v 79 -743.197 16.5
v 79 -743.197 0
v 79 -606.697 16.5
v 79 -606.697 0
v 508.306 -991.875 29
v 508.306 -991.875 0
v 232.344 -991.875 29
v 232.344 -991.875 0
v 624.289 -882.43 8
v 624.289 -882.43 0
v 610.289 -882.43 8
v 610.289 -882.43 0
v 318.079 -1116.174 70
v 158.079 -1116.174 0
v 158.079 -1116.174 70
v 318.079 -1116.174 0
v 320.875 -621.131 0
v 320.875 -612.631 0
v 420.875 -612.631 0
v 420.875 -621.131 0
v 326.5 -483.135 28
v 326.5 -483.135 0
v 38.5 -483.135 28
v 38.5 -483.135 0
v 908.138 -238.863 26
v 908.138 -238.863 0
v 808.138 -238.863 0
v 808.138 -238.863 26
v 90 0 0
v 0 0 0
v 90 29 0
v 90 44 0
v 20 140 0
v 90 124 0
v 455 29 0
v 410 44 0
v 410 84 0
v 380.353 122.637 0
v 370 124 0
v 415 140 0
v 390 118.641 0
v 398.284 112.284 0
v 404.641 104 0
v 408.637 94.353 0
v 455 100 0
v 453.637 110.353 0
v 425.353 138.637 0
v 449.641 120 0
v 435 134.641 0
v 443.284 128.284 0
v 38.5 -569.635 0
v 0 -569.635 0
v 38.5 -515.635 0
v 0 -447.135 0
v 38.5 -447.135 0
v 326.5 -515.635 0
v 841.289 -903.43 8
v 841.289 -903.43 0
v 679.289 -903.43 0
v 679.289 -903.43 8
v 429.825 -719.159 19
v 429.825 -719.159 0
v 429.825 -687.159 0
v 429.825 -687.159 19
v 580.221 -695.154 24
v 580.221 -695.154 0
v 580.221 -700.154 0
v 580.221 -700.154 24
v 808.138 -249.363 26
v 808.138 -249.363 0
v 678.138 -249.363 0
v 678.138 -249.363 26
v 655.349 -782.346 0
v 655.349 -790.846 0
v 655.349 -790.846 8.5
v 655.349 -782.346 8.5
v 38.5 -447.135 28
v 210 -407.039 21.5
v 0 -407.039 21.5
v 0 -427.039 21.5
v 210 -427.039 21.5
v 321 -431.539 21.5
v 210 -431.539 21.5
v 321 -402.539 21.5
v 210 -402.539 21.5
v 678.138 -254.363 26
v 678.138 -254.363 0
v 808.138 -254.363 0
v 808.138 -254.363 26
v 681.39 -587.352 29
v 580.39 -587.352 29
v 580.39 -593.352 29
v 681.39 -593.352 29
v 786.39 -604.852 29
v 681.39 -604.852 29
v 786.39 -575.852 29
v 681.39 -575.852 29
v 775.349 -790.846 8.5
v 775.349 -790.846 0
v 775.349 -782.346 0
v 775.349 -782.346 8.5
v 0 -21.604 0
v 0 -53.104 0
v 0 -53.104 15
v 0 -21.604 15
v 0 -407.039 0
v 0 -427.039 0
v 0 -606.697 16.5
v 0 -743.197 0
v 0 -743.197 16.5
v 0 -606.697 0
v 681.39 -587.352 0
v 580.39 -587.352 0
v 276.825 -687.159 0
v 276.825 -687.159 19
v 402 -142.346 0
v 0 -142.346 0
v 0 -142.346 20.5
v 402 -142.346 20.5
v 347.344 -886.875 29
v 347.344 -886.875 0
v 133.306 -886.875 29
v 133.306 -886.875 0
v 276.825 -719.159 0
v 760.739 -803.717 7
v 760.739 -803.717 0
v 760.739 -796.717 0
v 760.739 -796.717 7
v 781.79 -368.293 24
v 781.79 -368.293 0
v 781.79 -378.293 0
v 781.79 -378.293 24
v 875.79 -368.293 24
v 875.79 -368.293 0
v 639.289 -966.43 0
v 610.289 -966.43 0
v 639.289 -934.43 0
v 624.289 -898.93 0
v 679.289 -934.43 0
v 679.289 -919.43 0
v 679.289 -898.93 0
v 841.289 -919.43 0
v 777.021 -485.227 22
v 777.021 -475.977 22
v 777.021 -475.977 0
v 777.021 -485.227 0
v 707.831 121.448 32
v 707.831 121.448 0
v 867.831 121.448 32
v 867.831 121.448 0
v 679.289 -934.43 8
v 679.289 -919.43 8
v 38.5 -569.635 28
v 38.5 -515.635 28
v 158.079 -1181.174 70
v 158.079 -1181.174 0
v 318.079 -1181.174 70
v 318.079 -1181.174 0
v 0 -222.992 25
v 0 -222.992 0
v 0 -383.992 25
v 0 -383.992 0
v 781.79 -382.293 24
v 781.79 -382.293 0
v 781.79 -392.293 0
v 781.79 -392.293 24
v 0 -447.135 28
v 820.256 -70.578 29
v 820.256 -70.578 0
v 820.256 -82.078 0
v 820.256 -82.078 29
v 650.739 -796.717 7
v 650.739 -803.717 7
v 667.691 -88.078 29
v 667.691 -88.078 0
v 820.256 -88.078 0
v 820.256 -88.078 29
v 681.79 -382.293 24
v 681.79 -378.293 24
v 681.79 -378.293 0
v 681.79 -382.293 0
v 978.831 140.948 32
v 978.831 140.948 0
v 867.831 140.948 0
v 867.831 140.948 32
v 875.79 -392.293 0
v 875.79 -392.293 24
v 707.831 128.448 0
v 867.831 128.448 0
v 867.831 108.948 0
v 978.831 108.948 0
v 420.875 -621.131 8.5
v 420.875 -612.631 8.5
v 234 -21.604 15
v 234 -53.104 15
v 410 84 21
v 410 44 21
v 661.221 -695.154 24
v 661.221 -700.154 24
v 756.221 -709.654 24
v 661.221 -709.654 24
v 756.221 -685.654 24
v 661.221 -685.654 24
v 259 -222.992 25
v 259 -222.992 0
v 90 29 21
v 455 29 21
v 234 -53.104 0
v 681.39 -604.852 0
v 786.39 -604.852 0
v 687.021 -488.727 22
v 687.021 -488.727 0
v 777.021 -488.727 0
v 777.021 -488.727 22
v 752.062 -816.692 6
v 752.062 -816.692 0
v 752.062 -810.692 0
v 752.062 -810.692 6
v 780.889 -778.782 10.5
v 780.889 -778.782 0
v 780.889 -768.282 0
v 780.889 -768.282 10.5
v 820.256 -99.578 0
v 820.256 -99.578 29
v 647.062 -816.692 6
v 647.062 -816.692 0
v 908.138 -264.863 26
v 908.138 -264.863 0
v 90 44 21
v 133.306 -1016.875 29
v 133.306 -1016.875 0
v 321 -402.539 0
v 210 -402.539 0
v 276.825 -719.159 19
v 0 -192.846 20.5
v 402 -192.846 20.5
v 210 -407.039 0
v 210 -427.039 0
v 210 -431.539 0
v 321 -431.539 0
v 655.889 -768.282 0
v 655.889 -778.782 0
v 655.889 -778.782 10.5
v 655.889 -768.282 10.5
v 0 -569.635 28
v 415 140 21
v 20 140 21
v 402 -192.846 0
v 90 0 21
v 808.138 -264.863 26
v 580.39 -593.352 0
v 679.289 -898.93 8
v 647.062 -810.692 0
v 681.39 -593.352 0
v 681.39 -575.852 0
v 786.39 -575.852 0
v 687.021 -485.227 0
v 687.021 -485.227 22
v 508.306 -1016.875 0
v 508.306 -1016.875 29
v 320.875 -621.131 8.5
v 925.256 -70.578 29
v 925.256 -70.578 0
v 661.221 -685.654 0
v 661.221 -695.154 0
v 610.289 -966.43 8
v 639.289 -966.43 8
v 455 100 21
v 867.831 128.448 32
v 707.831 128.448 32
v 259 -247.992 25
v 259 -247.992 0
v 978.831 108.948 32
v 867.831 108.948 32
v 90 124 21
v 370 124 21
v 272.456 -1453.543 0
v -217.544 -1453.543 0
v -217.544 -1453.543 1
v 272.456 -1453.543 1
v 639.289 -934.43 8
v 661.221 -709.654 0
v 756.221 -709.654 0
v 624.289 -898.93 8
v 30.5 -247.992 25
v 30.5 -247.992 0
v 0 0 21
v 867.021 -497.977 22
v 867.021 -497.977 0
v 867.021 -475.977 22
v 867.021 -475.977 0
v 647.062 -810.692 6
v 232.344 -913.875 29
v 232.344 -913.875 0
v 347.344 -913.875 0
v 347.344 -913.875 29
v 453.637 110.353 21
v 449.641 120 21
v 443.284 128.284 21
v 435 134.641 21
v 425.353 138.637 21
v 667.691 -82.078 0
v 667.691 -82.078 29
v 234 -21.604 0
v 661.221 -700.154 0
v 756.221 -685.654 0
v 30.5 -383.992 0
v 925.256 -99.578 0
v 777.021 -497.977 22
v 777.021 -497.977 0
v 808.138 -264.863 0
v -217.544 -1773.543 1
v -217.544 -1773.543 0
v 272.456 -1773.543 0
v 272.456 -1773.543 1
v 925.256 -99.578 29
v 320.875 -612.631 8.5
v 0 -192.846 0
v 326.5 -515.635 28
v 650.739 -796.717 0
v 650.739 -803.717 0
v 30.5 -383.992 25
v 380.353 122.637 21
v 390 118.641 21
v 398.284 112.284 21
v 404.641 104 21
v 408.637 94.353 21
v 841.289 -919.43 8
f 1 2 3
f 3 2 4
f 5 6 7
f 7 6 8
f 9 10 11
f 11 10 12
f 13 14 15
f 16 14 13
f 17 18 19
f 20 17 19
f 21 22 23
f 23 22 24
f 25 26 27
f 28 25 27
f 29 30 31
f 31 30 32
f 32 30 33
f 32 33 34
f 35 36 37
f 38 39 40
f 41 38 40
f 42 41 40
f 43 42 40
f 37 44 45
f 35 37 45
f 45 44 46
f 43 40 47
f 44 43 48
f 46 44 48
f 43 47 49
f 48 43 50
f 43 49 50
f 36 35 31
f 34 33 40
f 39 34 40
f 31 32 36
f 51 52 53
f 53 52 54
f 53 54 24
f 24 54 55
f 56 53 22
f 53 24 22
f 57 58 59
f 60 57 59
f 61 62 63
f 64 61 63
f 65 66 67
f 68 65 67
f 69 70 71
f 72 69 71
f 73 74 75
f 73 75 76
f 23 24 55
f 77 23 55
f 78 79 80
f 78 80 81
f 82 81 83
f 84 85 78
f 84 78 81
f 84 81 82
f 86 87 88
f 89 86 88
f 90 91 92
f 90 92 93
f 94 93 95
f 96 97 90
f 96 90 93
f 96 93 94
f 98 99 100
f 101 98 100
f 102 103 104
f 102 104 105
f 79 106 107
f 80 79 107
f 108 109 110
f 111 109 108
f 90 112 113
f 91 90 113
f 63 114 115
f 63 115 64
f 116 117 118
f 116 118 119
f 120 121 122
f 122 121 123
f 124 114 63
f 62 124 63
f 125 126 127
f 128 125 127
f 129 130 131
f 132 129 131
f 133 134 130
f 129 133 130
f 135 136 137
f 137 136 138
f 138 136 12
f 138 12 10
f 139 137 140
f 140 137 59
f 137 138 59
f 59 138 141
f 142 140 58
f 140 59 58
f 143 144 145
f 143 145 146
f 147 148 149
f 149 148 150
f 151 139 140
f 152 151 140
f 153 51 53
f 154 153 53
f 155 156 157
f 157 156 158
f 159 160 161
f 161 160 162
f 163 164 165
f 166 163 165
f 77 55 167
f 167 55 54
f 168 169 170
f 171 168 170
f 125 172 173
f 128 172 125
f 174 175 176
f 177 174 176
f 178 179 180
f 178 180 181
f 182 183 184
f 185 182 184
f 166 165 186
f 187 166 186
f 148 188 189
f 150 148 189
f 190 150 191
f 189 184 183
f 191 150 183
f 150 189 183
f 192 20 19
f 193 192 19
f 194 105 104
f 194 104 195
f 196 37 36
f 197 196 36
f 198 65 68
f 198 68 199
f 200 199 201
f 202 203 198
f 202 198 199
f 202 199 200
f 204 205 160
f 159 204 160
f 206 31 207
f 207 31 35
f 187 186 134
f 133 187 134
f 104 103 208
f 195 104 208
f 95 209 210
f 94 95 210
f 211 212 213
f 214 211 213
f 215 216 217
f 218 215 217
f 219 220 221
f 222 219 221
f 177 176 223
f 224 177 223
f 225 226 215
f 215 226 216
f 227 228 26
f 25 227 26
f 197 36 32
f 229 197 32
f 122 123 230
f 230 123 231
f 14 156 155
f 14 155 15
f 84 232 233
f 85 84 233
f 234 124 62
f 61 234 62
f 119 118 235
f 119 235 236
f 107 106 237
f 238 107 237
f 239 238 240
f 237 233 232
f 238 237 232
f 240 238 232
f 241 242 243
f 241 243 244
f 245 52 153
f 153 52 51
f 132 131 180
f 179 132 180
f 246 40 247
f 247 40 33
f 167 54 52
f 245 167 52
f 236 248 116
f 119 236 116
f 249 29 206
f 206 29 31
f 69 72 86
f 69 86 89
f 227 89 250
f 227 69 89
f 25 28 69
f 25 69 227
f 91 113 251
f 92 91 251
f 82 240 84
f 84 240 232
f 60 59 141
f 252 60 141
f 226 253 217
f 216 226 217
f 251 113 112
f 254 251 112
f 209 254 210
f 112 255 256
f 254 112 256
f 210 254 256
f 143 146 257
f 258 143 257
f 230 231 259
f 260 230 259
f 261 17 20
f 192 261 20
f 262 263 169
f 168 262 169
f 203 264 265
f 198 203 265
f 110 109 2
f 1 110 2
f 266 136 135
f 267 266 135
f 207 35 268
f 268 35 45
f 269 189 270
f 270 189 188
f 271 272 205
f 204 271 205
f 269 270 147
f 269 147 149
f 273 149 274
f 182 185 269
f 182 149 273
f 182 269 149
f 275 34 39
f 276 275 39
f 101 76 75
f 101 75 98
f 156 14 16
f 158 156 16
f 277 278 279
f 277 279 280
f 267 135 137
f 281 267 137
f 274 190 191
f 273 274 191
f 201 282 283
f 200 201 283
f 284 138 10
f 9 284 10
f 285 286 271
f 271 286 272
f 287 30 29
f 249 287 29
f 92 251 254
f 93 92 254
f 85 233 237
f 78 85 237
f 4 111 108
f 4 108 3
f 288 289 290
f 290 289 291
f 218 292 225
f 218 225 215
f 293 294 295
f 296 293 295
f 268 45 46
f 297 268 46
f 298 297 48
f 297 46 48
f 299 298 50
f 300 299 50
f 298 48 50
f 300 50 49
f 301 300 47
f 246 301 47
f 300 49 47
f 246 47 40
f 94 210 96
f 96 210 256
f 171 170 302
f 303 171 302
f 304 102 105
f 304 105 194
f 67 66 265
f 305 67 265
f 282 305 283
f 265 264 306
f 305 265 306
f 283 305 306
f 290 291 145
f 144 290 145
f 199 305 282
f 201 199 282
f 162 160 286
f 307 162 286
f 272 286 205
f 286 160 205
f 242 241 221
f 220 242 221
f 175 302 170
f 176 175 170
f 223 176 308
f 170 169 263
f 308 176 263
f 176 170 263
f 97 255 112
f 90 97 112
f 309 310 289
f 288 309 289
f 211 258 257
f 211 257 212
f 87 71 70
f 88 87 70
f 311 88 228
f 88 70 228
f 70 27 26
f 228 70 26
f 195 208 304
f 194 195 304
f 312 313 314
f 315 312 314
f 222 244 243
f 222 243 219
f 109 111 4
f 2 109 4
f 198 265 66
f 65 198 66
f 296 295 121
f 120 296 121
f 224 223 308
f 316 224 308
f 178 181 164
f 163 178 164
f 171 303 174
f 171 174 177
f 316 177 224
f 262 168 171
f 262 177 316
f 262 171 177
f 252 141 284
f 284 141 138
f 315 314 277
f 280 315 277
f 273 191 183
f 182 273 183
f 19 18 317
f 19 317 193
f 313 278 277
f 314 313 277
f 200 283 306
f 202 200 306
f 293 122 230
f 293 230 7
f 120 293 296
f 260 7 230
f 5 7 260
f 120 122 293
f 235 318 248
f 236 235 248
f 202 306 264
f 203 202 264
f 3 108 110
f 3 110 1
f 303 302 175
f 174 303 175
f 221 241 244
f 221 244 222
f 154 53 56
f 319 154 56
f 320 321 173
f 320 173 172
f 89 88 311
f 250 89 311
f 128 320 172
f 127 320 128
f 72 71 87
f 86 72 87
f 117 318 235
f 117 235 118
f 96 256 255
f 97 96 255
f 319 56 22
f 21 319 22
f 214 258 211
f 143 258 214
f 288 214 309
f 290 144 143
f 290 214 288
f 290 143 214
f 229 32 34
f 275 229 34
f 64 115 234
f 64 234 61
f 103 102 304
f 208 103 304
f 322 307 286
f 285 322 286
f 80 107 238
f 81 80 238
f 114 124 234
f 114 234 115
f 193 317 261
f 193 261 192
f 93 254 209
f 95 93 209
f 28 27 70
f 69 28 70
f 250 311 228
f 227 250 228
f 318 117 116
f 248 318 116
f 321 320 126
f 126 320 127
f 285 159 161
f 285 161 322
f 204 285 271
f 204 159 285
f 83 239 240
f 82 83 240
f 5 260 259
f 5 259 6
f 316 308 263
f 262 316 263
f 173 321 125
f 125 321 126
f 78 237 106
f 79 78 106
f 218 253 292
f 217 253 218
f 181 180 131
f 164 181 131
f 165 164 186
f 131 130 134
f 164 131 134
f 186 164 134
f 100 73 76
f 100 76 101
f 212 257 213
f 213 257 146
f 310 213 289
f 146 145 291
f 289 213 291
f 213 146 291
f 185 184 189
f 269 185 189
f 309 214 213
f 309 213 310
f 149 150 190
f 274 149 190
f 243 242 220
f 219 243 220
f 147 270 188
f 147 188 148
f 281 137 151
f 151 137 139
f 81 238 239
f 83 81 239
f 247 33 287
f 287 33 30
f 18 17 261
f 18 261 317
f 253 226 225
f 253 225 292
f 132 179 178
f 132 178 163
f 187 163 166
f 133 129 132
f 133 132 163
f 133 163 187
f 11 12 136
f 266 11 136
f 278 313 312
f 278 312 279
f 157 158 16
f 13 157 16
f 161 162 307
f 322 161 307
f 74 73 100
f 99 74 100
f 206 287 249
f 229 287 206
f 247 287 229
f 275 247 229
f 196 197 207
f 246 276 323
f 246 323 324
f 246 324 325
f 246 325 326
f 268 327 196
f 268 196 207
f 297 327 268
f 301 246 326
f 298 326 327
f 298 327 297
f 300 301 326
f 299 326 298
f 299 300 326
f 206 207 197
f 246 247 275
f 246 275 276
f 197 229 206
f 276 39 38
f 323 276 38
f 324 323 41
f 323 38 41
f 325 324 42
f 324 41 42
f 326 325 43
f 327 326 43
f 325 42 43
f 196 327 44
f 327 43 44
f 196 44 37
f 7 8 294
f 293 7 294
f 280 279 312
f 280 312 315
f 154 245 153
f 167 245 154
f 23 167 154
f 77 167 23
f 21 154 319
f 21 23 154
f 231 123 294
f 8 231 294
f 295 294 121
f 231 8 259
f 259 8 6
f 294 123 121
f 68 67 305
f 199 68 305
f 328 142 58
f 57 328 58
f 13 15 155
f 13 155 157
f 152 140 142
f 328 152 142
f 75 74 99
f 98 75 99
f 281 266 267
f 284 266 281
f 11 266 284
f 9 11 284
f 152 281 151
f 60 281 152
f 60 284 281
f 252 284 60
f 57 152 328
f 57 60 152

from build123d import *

# Parameters (mm, degrees)
F1_DEPTH  = 21
F2_W      = 234
F2_H      = 31.5
F3_DEPTH  = 15
F4_W      = 402
F4_H      = 50.5
F5_DEPTH  = 20.5
F7_DEPTH  = 25
F9_DEPTH  = 21.5
F11_DEPTH = 28
F12_W     = 79
F12_H     = 136.5
F13_DEPTH = 16.5
F15_DEPTH = 32
F17_DEPTH = 29
F19_DEPTH = 26
F21_DEPTH = 24
F23_DEPTH = 22
F25_DEPTH = 29
F27_DEPTH = 24
F28_W     = 125
F28_H     = 10.5
F29_DEPTH = 10.5
F30_W     = 120
F30_H     = 8.5
F31_DEPTH = 8.5
F32_W     = 110
F32_H     = 7
F33_DEPTH = 7
F34_W     = 105
F34_H     = 6
F35_DEPTH = 6
F36_W     = 100
F36_H     = 8.5
F37_DEPTH = 8.5
F38_W     = 153
F38_H     = 32
F39_DEPTH = 19
F41_DEPTH = 29
F42_W     = 160
F42_H     = 65
F43_DEPTH = 70
F45_DEPTH = 8
F46_W     = 490
F46_H     = 320
F47_DEPTH = 1


with BuildPart() as f1:
    # F0 (on Top) → F1 (new body)
    with BuildSketch(Plane.XY):
        with BuildLine():
            Line((90, 29), (455, 29))
            Line((455, 29), (455, 100))
            ThreePointArc((455, 100), (443.284271, 128.284271), (415, 140))
            Line((415, 140), (20, 140))
            Line((20, 140), (0, 0))
            Line((0, 0), (90, 0))
            Line((90, 0), (90, 29))
        make_face()
        with BuildLine():
            Line((90, 44), (90, 124))
            Line((90, 124), (370, 124))
            ThreePointArc((370, 124), (398.284271, 112.284271), (410, 84))
            Line((410, 84), (410, 44))
            Line((410, 44), (90, 44))
        make_face(mode=Mode.SUBTRACT)
    extrude(amount=F1_DEPTH)


with BuildPart() as f3:
    # F2 (on Top) → F3 (new body)
    with BuildSketch(Plane.XY):
        with Locations((117, -37.354158)):
            Rectangle(F2_W, F2_H)
    extrude(amount=F3_DEPTH)


with BuildPart() as f5:
    # F4 (on Top) → F5 (new body)
    with BuildSketch(Plane.XY):
        with Locations((201, -167.595745)):
            Rectangle(F4_W, F4_H)
    extrude(amount=F5_DEPTH)


with BuildPart() as f7:
    # F6 (on Top) → F7 (new body)
    with BuildSketch(Plane.XY):
        Polygon((259, -247.991928), (259, -222.991928), (0, -222.991928), (0, -383.991928), (30.5, -383.991928), (30.5, -247.991928), align=None)
    extrude(amount=F7_DEPTH)


with BuildPart() as f9:
    # F8 (on Top) → F9 (new body)
    with BuildSketch(Plane.XY):
        Polygon((210, -407.039392), (0, -407.039392), (0, -427.039392), (210, -427.039392), (210, -431.539392), (321, -431.539392), (321, -402.539392), (210, -402.539392), align=None)
    extrude(amount=F9_DEPTH)


with BuildPart() as f11:
    # F10 (on Top) → F11 (new body)
    with BuildSketch(Plane.XY):
        Polygon((38.5, -447.135062), (0, -447.135062), (0, -569.635062), (38.5, -569.635062), (38.5, -515.635062), (326.5, -515.635062), (326.5, -483.135062), (38.5, -483.135062), align=None)
    extrude(amount=F11_DEPTH)


with BuildPart() as f13:
    # F12 (on Top) → F13 (new body)
    with BuildSketch(Plane.XY):
        with Locations((39.5, -674.947464)):
            Rectangle(F12_W, F12_H)
    extrude(amount=F13_DEPTH)


with BuildPart() as f15:
    # F14 (on Top) → F15 (new body)
    with BuildSketch(Plane.XY):
        Polygon((867.831475, 128.447544), (707.831475, 128.447544), (707.831475, 121.447544), (867.831475, 121.447544), (867.831475, 108.947544), (978.831475, 108.947544), (978.831475, 140.947544), (867.831475, 140.947544), align=None)
    extrude(amount=F15_DEPTH)


with BuildPart() as f17:
    # F16 (on Top) → F17 (new body)
    with BuildSketch(Plane.XY):
        Polygon((820.255642, -82.077995), (667.691423, -82.077995), (667.691423, -88.077995), (820.255642, -88.077995), (820.255642, -99.577995), (925.255642, -99.577995), (925.255642, -70.577995), (820.255642, -70.577995), align=None)
    extrude(amount=F17_DEPTH)


with BuildPart() as f19:
    # F18 (on Top) → F19 (new body)
    with BuildSketch(Plane.XY):
        Polygon((808.137628, -249.362517), (678.137592, -249.362517), (678.137592, -254.362517), (808.137628, -254.362517), (808.137628, -264.862517), (908.137628, -264.862517), (908.137628, -238.862517), (808.137628, -238.862517), align=None)
    extrude(amount=F19_DEPTH)


with BuildPart() as f21:
    # F20 (on Top) → F21 (new body)
    with BuildSketch(Plane.XY):
        Polygon((781.789992, -378.292733), (681.789992, -378.292733), (681.789992, -382.292733), (781.789992, -382.292733), (781.789992, -392.292733), (875.789992, -392.292733), (875.789992, -368.292733), (781.789992, -368.292733), align=None)
    extrude(amount=F21_DEPTH)


with BuildPart() as f23:
    # F22 (on Top) → F23 (new body)
    with BuildSketch(Plane.XY):
        Polygon((777.021242, -485.226869), (687.021242, -485.226869), (687.021242, -488.726869), (777.021242, -488.726869), (777.021242, -497.976869), (867.021242, -497.976869), (867.021242, -475.976869), (777.021242, -475.976869), align=None)
    extrude(amount=F23_DEPTH)


with BuildPart() as f25:
    # F24 (on Top) → F25 (new body)
    with BuildSketch(Plane.XY):
        Polygon((681.389749, -587.351922), (580.389749, -587.351922), (580.389749, -593.351922), (681.389749, -593.351922), (681.389749, -604.851922), (786.389749, -604.851922), (786.389749, -575.851922), (681.389749, -575.851922), align=None)
    extrude(amount=F25_DEPTH)


with BuildPart() as f27:
    # F26 (on Top) → F27 (new body)
    with BuildSketch(Plane.XY):
        Polygon((661.221033, -695.153743), (580.221033, -695.153743), (580.221033, -700.153743), (661.221033, -700.153743), (661.221033, -709.653743), (756.221033, -709.653743), (756.221033, -685.653743), (661.221033, -685.653743), align=None)
    extrude(amount=F27_DEPTH)


with BuildPart() as f29:
    # F28 (on Top) → F29 (new body)
    with BuildSketch(Plane.XY):
        with Locations((718.389003, -773.53248)):
            Rectangle(F28_W, F28_H)
    extrude(amount=F29_DEPTH)


with BuildPart() as f31:
    # F30 (on Top) → F31 (new body)
    with BuildSketch(Plane.XY):
        with Locations((715.349168, -786.595958)):
            Rectangle(F30_W, F30_H)
    extrude(amount=F31_DEPTH)


with BuildPart() as f33:
    # F32 (on Top) → F33 (new body)
    with BuildSketch(Plane.XY):
        with Locations((705.738574, -800.216655)):
            Rectangle(F32_W, F32_H)
    extrude(amount=F33_DEPTH)


with BuildPart() as f35:
    # F34 (on Top) → F35 (new body)
    with BuildSketch(Plane.XY):
        with Locations((699.561834, -813.692123)):
            Rectangle(F34_W, F34_H)
    extrude(amount=F35_DEPTH)


with BuildPart() as f37:
    # F36 (on Top) → F37 (new body)
    with BuildSketch(Plane.XY):
        with Locations((370.875239, -616.881128)):
            Rectangle(F36_W, F36_H)
    extrude(amount=F37_DEPTH)


with BuildPart() as f39:
    # F38 (on Top) → F39 (new body)
    with BuildSketch(Plane.XY):
        with Locations((353.325054, -703.158791)):
            Rectangle(F38_W, F38_H)
    extrude(amount=F39_DEPTH)


with BuildPart() as f41:
    # F40 (on Top) → F41 (new body)
    with BuildSketch(Plane.XY):
        Polygon((133.305624, -1016.875479), (508.305624, -1016.875479), (508.305624, -991.875479), (232.344094, -991.875479), (232.344094, -913.875479), (347.344094, -913.875479), (347.344094, -886.875479), (133.305624, -886.875479), align=None)
    extrude(amount=F41_DEPTH)


with BuildPart() as f43:
    # F42 (on Top) → F43 (new body)
    with BuildSketch(Plane.XY):
        with Locations((238.079123, -1148.674007)):
            Rectangle(F42_W, F42_H)
    extrude(amount=F43_DEPTH)


with BuildPart() as f45:
    # F44 (on Top) → F45 (new body)
    with BuildSketch(Plane.XY):
        Polygon((841.289062, -919.429519), (841.289062, -903.429519), (679.289062, -903.429519), (679.289062, -898.929519), (624.289062, -898.929519), (624.289062, -882.429519), (610.289062, -882.429519), (610.289062, -966.429519), (639.289062, -966.429519), (639.289062, -934.429519), (679.289062, -934.429519), (679.289062, -919.429519), align=None)
    extrude(amount=F45_DEPTH)


with BuildPart() as f47:
    # F46 (on Top) → F47 (new body)
    with BuildSketch(Plane.XY):
        with Locations((27.455986, -1613.542534)):
            Rectangle(F46_W, F46_H)
    extrude(amount=F47_DEPTH)


solid = Compound([f1.part, f3.part, f5.part, f7.part, f9.part, f11.part, f13.part, f15.part, f17.part, f19.part, f21.part, f23.part, f25.part, f27.part, f29.part, f31.part, f33.part, f35.part, f37.part, f39.part, f41.part, f43.part, f45.part, f47.part])
